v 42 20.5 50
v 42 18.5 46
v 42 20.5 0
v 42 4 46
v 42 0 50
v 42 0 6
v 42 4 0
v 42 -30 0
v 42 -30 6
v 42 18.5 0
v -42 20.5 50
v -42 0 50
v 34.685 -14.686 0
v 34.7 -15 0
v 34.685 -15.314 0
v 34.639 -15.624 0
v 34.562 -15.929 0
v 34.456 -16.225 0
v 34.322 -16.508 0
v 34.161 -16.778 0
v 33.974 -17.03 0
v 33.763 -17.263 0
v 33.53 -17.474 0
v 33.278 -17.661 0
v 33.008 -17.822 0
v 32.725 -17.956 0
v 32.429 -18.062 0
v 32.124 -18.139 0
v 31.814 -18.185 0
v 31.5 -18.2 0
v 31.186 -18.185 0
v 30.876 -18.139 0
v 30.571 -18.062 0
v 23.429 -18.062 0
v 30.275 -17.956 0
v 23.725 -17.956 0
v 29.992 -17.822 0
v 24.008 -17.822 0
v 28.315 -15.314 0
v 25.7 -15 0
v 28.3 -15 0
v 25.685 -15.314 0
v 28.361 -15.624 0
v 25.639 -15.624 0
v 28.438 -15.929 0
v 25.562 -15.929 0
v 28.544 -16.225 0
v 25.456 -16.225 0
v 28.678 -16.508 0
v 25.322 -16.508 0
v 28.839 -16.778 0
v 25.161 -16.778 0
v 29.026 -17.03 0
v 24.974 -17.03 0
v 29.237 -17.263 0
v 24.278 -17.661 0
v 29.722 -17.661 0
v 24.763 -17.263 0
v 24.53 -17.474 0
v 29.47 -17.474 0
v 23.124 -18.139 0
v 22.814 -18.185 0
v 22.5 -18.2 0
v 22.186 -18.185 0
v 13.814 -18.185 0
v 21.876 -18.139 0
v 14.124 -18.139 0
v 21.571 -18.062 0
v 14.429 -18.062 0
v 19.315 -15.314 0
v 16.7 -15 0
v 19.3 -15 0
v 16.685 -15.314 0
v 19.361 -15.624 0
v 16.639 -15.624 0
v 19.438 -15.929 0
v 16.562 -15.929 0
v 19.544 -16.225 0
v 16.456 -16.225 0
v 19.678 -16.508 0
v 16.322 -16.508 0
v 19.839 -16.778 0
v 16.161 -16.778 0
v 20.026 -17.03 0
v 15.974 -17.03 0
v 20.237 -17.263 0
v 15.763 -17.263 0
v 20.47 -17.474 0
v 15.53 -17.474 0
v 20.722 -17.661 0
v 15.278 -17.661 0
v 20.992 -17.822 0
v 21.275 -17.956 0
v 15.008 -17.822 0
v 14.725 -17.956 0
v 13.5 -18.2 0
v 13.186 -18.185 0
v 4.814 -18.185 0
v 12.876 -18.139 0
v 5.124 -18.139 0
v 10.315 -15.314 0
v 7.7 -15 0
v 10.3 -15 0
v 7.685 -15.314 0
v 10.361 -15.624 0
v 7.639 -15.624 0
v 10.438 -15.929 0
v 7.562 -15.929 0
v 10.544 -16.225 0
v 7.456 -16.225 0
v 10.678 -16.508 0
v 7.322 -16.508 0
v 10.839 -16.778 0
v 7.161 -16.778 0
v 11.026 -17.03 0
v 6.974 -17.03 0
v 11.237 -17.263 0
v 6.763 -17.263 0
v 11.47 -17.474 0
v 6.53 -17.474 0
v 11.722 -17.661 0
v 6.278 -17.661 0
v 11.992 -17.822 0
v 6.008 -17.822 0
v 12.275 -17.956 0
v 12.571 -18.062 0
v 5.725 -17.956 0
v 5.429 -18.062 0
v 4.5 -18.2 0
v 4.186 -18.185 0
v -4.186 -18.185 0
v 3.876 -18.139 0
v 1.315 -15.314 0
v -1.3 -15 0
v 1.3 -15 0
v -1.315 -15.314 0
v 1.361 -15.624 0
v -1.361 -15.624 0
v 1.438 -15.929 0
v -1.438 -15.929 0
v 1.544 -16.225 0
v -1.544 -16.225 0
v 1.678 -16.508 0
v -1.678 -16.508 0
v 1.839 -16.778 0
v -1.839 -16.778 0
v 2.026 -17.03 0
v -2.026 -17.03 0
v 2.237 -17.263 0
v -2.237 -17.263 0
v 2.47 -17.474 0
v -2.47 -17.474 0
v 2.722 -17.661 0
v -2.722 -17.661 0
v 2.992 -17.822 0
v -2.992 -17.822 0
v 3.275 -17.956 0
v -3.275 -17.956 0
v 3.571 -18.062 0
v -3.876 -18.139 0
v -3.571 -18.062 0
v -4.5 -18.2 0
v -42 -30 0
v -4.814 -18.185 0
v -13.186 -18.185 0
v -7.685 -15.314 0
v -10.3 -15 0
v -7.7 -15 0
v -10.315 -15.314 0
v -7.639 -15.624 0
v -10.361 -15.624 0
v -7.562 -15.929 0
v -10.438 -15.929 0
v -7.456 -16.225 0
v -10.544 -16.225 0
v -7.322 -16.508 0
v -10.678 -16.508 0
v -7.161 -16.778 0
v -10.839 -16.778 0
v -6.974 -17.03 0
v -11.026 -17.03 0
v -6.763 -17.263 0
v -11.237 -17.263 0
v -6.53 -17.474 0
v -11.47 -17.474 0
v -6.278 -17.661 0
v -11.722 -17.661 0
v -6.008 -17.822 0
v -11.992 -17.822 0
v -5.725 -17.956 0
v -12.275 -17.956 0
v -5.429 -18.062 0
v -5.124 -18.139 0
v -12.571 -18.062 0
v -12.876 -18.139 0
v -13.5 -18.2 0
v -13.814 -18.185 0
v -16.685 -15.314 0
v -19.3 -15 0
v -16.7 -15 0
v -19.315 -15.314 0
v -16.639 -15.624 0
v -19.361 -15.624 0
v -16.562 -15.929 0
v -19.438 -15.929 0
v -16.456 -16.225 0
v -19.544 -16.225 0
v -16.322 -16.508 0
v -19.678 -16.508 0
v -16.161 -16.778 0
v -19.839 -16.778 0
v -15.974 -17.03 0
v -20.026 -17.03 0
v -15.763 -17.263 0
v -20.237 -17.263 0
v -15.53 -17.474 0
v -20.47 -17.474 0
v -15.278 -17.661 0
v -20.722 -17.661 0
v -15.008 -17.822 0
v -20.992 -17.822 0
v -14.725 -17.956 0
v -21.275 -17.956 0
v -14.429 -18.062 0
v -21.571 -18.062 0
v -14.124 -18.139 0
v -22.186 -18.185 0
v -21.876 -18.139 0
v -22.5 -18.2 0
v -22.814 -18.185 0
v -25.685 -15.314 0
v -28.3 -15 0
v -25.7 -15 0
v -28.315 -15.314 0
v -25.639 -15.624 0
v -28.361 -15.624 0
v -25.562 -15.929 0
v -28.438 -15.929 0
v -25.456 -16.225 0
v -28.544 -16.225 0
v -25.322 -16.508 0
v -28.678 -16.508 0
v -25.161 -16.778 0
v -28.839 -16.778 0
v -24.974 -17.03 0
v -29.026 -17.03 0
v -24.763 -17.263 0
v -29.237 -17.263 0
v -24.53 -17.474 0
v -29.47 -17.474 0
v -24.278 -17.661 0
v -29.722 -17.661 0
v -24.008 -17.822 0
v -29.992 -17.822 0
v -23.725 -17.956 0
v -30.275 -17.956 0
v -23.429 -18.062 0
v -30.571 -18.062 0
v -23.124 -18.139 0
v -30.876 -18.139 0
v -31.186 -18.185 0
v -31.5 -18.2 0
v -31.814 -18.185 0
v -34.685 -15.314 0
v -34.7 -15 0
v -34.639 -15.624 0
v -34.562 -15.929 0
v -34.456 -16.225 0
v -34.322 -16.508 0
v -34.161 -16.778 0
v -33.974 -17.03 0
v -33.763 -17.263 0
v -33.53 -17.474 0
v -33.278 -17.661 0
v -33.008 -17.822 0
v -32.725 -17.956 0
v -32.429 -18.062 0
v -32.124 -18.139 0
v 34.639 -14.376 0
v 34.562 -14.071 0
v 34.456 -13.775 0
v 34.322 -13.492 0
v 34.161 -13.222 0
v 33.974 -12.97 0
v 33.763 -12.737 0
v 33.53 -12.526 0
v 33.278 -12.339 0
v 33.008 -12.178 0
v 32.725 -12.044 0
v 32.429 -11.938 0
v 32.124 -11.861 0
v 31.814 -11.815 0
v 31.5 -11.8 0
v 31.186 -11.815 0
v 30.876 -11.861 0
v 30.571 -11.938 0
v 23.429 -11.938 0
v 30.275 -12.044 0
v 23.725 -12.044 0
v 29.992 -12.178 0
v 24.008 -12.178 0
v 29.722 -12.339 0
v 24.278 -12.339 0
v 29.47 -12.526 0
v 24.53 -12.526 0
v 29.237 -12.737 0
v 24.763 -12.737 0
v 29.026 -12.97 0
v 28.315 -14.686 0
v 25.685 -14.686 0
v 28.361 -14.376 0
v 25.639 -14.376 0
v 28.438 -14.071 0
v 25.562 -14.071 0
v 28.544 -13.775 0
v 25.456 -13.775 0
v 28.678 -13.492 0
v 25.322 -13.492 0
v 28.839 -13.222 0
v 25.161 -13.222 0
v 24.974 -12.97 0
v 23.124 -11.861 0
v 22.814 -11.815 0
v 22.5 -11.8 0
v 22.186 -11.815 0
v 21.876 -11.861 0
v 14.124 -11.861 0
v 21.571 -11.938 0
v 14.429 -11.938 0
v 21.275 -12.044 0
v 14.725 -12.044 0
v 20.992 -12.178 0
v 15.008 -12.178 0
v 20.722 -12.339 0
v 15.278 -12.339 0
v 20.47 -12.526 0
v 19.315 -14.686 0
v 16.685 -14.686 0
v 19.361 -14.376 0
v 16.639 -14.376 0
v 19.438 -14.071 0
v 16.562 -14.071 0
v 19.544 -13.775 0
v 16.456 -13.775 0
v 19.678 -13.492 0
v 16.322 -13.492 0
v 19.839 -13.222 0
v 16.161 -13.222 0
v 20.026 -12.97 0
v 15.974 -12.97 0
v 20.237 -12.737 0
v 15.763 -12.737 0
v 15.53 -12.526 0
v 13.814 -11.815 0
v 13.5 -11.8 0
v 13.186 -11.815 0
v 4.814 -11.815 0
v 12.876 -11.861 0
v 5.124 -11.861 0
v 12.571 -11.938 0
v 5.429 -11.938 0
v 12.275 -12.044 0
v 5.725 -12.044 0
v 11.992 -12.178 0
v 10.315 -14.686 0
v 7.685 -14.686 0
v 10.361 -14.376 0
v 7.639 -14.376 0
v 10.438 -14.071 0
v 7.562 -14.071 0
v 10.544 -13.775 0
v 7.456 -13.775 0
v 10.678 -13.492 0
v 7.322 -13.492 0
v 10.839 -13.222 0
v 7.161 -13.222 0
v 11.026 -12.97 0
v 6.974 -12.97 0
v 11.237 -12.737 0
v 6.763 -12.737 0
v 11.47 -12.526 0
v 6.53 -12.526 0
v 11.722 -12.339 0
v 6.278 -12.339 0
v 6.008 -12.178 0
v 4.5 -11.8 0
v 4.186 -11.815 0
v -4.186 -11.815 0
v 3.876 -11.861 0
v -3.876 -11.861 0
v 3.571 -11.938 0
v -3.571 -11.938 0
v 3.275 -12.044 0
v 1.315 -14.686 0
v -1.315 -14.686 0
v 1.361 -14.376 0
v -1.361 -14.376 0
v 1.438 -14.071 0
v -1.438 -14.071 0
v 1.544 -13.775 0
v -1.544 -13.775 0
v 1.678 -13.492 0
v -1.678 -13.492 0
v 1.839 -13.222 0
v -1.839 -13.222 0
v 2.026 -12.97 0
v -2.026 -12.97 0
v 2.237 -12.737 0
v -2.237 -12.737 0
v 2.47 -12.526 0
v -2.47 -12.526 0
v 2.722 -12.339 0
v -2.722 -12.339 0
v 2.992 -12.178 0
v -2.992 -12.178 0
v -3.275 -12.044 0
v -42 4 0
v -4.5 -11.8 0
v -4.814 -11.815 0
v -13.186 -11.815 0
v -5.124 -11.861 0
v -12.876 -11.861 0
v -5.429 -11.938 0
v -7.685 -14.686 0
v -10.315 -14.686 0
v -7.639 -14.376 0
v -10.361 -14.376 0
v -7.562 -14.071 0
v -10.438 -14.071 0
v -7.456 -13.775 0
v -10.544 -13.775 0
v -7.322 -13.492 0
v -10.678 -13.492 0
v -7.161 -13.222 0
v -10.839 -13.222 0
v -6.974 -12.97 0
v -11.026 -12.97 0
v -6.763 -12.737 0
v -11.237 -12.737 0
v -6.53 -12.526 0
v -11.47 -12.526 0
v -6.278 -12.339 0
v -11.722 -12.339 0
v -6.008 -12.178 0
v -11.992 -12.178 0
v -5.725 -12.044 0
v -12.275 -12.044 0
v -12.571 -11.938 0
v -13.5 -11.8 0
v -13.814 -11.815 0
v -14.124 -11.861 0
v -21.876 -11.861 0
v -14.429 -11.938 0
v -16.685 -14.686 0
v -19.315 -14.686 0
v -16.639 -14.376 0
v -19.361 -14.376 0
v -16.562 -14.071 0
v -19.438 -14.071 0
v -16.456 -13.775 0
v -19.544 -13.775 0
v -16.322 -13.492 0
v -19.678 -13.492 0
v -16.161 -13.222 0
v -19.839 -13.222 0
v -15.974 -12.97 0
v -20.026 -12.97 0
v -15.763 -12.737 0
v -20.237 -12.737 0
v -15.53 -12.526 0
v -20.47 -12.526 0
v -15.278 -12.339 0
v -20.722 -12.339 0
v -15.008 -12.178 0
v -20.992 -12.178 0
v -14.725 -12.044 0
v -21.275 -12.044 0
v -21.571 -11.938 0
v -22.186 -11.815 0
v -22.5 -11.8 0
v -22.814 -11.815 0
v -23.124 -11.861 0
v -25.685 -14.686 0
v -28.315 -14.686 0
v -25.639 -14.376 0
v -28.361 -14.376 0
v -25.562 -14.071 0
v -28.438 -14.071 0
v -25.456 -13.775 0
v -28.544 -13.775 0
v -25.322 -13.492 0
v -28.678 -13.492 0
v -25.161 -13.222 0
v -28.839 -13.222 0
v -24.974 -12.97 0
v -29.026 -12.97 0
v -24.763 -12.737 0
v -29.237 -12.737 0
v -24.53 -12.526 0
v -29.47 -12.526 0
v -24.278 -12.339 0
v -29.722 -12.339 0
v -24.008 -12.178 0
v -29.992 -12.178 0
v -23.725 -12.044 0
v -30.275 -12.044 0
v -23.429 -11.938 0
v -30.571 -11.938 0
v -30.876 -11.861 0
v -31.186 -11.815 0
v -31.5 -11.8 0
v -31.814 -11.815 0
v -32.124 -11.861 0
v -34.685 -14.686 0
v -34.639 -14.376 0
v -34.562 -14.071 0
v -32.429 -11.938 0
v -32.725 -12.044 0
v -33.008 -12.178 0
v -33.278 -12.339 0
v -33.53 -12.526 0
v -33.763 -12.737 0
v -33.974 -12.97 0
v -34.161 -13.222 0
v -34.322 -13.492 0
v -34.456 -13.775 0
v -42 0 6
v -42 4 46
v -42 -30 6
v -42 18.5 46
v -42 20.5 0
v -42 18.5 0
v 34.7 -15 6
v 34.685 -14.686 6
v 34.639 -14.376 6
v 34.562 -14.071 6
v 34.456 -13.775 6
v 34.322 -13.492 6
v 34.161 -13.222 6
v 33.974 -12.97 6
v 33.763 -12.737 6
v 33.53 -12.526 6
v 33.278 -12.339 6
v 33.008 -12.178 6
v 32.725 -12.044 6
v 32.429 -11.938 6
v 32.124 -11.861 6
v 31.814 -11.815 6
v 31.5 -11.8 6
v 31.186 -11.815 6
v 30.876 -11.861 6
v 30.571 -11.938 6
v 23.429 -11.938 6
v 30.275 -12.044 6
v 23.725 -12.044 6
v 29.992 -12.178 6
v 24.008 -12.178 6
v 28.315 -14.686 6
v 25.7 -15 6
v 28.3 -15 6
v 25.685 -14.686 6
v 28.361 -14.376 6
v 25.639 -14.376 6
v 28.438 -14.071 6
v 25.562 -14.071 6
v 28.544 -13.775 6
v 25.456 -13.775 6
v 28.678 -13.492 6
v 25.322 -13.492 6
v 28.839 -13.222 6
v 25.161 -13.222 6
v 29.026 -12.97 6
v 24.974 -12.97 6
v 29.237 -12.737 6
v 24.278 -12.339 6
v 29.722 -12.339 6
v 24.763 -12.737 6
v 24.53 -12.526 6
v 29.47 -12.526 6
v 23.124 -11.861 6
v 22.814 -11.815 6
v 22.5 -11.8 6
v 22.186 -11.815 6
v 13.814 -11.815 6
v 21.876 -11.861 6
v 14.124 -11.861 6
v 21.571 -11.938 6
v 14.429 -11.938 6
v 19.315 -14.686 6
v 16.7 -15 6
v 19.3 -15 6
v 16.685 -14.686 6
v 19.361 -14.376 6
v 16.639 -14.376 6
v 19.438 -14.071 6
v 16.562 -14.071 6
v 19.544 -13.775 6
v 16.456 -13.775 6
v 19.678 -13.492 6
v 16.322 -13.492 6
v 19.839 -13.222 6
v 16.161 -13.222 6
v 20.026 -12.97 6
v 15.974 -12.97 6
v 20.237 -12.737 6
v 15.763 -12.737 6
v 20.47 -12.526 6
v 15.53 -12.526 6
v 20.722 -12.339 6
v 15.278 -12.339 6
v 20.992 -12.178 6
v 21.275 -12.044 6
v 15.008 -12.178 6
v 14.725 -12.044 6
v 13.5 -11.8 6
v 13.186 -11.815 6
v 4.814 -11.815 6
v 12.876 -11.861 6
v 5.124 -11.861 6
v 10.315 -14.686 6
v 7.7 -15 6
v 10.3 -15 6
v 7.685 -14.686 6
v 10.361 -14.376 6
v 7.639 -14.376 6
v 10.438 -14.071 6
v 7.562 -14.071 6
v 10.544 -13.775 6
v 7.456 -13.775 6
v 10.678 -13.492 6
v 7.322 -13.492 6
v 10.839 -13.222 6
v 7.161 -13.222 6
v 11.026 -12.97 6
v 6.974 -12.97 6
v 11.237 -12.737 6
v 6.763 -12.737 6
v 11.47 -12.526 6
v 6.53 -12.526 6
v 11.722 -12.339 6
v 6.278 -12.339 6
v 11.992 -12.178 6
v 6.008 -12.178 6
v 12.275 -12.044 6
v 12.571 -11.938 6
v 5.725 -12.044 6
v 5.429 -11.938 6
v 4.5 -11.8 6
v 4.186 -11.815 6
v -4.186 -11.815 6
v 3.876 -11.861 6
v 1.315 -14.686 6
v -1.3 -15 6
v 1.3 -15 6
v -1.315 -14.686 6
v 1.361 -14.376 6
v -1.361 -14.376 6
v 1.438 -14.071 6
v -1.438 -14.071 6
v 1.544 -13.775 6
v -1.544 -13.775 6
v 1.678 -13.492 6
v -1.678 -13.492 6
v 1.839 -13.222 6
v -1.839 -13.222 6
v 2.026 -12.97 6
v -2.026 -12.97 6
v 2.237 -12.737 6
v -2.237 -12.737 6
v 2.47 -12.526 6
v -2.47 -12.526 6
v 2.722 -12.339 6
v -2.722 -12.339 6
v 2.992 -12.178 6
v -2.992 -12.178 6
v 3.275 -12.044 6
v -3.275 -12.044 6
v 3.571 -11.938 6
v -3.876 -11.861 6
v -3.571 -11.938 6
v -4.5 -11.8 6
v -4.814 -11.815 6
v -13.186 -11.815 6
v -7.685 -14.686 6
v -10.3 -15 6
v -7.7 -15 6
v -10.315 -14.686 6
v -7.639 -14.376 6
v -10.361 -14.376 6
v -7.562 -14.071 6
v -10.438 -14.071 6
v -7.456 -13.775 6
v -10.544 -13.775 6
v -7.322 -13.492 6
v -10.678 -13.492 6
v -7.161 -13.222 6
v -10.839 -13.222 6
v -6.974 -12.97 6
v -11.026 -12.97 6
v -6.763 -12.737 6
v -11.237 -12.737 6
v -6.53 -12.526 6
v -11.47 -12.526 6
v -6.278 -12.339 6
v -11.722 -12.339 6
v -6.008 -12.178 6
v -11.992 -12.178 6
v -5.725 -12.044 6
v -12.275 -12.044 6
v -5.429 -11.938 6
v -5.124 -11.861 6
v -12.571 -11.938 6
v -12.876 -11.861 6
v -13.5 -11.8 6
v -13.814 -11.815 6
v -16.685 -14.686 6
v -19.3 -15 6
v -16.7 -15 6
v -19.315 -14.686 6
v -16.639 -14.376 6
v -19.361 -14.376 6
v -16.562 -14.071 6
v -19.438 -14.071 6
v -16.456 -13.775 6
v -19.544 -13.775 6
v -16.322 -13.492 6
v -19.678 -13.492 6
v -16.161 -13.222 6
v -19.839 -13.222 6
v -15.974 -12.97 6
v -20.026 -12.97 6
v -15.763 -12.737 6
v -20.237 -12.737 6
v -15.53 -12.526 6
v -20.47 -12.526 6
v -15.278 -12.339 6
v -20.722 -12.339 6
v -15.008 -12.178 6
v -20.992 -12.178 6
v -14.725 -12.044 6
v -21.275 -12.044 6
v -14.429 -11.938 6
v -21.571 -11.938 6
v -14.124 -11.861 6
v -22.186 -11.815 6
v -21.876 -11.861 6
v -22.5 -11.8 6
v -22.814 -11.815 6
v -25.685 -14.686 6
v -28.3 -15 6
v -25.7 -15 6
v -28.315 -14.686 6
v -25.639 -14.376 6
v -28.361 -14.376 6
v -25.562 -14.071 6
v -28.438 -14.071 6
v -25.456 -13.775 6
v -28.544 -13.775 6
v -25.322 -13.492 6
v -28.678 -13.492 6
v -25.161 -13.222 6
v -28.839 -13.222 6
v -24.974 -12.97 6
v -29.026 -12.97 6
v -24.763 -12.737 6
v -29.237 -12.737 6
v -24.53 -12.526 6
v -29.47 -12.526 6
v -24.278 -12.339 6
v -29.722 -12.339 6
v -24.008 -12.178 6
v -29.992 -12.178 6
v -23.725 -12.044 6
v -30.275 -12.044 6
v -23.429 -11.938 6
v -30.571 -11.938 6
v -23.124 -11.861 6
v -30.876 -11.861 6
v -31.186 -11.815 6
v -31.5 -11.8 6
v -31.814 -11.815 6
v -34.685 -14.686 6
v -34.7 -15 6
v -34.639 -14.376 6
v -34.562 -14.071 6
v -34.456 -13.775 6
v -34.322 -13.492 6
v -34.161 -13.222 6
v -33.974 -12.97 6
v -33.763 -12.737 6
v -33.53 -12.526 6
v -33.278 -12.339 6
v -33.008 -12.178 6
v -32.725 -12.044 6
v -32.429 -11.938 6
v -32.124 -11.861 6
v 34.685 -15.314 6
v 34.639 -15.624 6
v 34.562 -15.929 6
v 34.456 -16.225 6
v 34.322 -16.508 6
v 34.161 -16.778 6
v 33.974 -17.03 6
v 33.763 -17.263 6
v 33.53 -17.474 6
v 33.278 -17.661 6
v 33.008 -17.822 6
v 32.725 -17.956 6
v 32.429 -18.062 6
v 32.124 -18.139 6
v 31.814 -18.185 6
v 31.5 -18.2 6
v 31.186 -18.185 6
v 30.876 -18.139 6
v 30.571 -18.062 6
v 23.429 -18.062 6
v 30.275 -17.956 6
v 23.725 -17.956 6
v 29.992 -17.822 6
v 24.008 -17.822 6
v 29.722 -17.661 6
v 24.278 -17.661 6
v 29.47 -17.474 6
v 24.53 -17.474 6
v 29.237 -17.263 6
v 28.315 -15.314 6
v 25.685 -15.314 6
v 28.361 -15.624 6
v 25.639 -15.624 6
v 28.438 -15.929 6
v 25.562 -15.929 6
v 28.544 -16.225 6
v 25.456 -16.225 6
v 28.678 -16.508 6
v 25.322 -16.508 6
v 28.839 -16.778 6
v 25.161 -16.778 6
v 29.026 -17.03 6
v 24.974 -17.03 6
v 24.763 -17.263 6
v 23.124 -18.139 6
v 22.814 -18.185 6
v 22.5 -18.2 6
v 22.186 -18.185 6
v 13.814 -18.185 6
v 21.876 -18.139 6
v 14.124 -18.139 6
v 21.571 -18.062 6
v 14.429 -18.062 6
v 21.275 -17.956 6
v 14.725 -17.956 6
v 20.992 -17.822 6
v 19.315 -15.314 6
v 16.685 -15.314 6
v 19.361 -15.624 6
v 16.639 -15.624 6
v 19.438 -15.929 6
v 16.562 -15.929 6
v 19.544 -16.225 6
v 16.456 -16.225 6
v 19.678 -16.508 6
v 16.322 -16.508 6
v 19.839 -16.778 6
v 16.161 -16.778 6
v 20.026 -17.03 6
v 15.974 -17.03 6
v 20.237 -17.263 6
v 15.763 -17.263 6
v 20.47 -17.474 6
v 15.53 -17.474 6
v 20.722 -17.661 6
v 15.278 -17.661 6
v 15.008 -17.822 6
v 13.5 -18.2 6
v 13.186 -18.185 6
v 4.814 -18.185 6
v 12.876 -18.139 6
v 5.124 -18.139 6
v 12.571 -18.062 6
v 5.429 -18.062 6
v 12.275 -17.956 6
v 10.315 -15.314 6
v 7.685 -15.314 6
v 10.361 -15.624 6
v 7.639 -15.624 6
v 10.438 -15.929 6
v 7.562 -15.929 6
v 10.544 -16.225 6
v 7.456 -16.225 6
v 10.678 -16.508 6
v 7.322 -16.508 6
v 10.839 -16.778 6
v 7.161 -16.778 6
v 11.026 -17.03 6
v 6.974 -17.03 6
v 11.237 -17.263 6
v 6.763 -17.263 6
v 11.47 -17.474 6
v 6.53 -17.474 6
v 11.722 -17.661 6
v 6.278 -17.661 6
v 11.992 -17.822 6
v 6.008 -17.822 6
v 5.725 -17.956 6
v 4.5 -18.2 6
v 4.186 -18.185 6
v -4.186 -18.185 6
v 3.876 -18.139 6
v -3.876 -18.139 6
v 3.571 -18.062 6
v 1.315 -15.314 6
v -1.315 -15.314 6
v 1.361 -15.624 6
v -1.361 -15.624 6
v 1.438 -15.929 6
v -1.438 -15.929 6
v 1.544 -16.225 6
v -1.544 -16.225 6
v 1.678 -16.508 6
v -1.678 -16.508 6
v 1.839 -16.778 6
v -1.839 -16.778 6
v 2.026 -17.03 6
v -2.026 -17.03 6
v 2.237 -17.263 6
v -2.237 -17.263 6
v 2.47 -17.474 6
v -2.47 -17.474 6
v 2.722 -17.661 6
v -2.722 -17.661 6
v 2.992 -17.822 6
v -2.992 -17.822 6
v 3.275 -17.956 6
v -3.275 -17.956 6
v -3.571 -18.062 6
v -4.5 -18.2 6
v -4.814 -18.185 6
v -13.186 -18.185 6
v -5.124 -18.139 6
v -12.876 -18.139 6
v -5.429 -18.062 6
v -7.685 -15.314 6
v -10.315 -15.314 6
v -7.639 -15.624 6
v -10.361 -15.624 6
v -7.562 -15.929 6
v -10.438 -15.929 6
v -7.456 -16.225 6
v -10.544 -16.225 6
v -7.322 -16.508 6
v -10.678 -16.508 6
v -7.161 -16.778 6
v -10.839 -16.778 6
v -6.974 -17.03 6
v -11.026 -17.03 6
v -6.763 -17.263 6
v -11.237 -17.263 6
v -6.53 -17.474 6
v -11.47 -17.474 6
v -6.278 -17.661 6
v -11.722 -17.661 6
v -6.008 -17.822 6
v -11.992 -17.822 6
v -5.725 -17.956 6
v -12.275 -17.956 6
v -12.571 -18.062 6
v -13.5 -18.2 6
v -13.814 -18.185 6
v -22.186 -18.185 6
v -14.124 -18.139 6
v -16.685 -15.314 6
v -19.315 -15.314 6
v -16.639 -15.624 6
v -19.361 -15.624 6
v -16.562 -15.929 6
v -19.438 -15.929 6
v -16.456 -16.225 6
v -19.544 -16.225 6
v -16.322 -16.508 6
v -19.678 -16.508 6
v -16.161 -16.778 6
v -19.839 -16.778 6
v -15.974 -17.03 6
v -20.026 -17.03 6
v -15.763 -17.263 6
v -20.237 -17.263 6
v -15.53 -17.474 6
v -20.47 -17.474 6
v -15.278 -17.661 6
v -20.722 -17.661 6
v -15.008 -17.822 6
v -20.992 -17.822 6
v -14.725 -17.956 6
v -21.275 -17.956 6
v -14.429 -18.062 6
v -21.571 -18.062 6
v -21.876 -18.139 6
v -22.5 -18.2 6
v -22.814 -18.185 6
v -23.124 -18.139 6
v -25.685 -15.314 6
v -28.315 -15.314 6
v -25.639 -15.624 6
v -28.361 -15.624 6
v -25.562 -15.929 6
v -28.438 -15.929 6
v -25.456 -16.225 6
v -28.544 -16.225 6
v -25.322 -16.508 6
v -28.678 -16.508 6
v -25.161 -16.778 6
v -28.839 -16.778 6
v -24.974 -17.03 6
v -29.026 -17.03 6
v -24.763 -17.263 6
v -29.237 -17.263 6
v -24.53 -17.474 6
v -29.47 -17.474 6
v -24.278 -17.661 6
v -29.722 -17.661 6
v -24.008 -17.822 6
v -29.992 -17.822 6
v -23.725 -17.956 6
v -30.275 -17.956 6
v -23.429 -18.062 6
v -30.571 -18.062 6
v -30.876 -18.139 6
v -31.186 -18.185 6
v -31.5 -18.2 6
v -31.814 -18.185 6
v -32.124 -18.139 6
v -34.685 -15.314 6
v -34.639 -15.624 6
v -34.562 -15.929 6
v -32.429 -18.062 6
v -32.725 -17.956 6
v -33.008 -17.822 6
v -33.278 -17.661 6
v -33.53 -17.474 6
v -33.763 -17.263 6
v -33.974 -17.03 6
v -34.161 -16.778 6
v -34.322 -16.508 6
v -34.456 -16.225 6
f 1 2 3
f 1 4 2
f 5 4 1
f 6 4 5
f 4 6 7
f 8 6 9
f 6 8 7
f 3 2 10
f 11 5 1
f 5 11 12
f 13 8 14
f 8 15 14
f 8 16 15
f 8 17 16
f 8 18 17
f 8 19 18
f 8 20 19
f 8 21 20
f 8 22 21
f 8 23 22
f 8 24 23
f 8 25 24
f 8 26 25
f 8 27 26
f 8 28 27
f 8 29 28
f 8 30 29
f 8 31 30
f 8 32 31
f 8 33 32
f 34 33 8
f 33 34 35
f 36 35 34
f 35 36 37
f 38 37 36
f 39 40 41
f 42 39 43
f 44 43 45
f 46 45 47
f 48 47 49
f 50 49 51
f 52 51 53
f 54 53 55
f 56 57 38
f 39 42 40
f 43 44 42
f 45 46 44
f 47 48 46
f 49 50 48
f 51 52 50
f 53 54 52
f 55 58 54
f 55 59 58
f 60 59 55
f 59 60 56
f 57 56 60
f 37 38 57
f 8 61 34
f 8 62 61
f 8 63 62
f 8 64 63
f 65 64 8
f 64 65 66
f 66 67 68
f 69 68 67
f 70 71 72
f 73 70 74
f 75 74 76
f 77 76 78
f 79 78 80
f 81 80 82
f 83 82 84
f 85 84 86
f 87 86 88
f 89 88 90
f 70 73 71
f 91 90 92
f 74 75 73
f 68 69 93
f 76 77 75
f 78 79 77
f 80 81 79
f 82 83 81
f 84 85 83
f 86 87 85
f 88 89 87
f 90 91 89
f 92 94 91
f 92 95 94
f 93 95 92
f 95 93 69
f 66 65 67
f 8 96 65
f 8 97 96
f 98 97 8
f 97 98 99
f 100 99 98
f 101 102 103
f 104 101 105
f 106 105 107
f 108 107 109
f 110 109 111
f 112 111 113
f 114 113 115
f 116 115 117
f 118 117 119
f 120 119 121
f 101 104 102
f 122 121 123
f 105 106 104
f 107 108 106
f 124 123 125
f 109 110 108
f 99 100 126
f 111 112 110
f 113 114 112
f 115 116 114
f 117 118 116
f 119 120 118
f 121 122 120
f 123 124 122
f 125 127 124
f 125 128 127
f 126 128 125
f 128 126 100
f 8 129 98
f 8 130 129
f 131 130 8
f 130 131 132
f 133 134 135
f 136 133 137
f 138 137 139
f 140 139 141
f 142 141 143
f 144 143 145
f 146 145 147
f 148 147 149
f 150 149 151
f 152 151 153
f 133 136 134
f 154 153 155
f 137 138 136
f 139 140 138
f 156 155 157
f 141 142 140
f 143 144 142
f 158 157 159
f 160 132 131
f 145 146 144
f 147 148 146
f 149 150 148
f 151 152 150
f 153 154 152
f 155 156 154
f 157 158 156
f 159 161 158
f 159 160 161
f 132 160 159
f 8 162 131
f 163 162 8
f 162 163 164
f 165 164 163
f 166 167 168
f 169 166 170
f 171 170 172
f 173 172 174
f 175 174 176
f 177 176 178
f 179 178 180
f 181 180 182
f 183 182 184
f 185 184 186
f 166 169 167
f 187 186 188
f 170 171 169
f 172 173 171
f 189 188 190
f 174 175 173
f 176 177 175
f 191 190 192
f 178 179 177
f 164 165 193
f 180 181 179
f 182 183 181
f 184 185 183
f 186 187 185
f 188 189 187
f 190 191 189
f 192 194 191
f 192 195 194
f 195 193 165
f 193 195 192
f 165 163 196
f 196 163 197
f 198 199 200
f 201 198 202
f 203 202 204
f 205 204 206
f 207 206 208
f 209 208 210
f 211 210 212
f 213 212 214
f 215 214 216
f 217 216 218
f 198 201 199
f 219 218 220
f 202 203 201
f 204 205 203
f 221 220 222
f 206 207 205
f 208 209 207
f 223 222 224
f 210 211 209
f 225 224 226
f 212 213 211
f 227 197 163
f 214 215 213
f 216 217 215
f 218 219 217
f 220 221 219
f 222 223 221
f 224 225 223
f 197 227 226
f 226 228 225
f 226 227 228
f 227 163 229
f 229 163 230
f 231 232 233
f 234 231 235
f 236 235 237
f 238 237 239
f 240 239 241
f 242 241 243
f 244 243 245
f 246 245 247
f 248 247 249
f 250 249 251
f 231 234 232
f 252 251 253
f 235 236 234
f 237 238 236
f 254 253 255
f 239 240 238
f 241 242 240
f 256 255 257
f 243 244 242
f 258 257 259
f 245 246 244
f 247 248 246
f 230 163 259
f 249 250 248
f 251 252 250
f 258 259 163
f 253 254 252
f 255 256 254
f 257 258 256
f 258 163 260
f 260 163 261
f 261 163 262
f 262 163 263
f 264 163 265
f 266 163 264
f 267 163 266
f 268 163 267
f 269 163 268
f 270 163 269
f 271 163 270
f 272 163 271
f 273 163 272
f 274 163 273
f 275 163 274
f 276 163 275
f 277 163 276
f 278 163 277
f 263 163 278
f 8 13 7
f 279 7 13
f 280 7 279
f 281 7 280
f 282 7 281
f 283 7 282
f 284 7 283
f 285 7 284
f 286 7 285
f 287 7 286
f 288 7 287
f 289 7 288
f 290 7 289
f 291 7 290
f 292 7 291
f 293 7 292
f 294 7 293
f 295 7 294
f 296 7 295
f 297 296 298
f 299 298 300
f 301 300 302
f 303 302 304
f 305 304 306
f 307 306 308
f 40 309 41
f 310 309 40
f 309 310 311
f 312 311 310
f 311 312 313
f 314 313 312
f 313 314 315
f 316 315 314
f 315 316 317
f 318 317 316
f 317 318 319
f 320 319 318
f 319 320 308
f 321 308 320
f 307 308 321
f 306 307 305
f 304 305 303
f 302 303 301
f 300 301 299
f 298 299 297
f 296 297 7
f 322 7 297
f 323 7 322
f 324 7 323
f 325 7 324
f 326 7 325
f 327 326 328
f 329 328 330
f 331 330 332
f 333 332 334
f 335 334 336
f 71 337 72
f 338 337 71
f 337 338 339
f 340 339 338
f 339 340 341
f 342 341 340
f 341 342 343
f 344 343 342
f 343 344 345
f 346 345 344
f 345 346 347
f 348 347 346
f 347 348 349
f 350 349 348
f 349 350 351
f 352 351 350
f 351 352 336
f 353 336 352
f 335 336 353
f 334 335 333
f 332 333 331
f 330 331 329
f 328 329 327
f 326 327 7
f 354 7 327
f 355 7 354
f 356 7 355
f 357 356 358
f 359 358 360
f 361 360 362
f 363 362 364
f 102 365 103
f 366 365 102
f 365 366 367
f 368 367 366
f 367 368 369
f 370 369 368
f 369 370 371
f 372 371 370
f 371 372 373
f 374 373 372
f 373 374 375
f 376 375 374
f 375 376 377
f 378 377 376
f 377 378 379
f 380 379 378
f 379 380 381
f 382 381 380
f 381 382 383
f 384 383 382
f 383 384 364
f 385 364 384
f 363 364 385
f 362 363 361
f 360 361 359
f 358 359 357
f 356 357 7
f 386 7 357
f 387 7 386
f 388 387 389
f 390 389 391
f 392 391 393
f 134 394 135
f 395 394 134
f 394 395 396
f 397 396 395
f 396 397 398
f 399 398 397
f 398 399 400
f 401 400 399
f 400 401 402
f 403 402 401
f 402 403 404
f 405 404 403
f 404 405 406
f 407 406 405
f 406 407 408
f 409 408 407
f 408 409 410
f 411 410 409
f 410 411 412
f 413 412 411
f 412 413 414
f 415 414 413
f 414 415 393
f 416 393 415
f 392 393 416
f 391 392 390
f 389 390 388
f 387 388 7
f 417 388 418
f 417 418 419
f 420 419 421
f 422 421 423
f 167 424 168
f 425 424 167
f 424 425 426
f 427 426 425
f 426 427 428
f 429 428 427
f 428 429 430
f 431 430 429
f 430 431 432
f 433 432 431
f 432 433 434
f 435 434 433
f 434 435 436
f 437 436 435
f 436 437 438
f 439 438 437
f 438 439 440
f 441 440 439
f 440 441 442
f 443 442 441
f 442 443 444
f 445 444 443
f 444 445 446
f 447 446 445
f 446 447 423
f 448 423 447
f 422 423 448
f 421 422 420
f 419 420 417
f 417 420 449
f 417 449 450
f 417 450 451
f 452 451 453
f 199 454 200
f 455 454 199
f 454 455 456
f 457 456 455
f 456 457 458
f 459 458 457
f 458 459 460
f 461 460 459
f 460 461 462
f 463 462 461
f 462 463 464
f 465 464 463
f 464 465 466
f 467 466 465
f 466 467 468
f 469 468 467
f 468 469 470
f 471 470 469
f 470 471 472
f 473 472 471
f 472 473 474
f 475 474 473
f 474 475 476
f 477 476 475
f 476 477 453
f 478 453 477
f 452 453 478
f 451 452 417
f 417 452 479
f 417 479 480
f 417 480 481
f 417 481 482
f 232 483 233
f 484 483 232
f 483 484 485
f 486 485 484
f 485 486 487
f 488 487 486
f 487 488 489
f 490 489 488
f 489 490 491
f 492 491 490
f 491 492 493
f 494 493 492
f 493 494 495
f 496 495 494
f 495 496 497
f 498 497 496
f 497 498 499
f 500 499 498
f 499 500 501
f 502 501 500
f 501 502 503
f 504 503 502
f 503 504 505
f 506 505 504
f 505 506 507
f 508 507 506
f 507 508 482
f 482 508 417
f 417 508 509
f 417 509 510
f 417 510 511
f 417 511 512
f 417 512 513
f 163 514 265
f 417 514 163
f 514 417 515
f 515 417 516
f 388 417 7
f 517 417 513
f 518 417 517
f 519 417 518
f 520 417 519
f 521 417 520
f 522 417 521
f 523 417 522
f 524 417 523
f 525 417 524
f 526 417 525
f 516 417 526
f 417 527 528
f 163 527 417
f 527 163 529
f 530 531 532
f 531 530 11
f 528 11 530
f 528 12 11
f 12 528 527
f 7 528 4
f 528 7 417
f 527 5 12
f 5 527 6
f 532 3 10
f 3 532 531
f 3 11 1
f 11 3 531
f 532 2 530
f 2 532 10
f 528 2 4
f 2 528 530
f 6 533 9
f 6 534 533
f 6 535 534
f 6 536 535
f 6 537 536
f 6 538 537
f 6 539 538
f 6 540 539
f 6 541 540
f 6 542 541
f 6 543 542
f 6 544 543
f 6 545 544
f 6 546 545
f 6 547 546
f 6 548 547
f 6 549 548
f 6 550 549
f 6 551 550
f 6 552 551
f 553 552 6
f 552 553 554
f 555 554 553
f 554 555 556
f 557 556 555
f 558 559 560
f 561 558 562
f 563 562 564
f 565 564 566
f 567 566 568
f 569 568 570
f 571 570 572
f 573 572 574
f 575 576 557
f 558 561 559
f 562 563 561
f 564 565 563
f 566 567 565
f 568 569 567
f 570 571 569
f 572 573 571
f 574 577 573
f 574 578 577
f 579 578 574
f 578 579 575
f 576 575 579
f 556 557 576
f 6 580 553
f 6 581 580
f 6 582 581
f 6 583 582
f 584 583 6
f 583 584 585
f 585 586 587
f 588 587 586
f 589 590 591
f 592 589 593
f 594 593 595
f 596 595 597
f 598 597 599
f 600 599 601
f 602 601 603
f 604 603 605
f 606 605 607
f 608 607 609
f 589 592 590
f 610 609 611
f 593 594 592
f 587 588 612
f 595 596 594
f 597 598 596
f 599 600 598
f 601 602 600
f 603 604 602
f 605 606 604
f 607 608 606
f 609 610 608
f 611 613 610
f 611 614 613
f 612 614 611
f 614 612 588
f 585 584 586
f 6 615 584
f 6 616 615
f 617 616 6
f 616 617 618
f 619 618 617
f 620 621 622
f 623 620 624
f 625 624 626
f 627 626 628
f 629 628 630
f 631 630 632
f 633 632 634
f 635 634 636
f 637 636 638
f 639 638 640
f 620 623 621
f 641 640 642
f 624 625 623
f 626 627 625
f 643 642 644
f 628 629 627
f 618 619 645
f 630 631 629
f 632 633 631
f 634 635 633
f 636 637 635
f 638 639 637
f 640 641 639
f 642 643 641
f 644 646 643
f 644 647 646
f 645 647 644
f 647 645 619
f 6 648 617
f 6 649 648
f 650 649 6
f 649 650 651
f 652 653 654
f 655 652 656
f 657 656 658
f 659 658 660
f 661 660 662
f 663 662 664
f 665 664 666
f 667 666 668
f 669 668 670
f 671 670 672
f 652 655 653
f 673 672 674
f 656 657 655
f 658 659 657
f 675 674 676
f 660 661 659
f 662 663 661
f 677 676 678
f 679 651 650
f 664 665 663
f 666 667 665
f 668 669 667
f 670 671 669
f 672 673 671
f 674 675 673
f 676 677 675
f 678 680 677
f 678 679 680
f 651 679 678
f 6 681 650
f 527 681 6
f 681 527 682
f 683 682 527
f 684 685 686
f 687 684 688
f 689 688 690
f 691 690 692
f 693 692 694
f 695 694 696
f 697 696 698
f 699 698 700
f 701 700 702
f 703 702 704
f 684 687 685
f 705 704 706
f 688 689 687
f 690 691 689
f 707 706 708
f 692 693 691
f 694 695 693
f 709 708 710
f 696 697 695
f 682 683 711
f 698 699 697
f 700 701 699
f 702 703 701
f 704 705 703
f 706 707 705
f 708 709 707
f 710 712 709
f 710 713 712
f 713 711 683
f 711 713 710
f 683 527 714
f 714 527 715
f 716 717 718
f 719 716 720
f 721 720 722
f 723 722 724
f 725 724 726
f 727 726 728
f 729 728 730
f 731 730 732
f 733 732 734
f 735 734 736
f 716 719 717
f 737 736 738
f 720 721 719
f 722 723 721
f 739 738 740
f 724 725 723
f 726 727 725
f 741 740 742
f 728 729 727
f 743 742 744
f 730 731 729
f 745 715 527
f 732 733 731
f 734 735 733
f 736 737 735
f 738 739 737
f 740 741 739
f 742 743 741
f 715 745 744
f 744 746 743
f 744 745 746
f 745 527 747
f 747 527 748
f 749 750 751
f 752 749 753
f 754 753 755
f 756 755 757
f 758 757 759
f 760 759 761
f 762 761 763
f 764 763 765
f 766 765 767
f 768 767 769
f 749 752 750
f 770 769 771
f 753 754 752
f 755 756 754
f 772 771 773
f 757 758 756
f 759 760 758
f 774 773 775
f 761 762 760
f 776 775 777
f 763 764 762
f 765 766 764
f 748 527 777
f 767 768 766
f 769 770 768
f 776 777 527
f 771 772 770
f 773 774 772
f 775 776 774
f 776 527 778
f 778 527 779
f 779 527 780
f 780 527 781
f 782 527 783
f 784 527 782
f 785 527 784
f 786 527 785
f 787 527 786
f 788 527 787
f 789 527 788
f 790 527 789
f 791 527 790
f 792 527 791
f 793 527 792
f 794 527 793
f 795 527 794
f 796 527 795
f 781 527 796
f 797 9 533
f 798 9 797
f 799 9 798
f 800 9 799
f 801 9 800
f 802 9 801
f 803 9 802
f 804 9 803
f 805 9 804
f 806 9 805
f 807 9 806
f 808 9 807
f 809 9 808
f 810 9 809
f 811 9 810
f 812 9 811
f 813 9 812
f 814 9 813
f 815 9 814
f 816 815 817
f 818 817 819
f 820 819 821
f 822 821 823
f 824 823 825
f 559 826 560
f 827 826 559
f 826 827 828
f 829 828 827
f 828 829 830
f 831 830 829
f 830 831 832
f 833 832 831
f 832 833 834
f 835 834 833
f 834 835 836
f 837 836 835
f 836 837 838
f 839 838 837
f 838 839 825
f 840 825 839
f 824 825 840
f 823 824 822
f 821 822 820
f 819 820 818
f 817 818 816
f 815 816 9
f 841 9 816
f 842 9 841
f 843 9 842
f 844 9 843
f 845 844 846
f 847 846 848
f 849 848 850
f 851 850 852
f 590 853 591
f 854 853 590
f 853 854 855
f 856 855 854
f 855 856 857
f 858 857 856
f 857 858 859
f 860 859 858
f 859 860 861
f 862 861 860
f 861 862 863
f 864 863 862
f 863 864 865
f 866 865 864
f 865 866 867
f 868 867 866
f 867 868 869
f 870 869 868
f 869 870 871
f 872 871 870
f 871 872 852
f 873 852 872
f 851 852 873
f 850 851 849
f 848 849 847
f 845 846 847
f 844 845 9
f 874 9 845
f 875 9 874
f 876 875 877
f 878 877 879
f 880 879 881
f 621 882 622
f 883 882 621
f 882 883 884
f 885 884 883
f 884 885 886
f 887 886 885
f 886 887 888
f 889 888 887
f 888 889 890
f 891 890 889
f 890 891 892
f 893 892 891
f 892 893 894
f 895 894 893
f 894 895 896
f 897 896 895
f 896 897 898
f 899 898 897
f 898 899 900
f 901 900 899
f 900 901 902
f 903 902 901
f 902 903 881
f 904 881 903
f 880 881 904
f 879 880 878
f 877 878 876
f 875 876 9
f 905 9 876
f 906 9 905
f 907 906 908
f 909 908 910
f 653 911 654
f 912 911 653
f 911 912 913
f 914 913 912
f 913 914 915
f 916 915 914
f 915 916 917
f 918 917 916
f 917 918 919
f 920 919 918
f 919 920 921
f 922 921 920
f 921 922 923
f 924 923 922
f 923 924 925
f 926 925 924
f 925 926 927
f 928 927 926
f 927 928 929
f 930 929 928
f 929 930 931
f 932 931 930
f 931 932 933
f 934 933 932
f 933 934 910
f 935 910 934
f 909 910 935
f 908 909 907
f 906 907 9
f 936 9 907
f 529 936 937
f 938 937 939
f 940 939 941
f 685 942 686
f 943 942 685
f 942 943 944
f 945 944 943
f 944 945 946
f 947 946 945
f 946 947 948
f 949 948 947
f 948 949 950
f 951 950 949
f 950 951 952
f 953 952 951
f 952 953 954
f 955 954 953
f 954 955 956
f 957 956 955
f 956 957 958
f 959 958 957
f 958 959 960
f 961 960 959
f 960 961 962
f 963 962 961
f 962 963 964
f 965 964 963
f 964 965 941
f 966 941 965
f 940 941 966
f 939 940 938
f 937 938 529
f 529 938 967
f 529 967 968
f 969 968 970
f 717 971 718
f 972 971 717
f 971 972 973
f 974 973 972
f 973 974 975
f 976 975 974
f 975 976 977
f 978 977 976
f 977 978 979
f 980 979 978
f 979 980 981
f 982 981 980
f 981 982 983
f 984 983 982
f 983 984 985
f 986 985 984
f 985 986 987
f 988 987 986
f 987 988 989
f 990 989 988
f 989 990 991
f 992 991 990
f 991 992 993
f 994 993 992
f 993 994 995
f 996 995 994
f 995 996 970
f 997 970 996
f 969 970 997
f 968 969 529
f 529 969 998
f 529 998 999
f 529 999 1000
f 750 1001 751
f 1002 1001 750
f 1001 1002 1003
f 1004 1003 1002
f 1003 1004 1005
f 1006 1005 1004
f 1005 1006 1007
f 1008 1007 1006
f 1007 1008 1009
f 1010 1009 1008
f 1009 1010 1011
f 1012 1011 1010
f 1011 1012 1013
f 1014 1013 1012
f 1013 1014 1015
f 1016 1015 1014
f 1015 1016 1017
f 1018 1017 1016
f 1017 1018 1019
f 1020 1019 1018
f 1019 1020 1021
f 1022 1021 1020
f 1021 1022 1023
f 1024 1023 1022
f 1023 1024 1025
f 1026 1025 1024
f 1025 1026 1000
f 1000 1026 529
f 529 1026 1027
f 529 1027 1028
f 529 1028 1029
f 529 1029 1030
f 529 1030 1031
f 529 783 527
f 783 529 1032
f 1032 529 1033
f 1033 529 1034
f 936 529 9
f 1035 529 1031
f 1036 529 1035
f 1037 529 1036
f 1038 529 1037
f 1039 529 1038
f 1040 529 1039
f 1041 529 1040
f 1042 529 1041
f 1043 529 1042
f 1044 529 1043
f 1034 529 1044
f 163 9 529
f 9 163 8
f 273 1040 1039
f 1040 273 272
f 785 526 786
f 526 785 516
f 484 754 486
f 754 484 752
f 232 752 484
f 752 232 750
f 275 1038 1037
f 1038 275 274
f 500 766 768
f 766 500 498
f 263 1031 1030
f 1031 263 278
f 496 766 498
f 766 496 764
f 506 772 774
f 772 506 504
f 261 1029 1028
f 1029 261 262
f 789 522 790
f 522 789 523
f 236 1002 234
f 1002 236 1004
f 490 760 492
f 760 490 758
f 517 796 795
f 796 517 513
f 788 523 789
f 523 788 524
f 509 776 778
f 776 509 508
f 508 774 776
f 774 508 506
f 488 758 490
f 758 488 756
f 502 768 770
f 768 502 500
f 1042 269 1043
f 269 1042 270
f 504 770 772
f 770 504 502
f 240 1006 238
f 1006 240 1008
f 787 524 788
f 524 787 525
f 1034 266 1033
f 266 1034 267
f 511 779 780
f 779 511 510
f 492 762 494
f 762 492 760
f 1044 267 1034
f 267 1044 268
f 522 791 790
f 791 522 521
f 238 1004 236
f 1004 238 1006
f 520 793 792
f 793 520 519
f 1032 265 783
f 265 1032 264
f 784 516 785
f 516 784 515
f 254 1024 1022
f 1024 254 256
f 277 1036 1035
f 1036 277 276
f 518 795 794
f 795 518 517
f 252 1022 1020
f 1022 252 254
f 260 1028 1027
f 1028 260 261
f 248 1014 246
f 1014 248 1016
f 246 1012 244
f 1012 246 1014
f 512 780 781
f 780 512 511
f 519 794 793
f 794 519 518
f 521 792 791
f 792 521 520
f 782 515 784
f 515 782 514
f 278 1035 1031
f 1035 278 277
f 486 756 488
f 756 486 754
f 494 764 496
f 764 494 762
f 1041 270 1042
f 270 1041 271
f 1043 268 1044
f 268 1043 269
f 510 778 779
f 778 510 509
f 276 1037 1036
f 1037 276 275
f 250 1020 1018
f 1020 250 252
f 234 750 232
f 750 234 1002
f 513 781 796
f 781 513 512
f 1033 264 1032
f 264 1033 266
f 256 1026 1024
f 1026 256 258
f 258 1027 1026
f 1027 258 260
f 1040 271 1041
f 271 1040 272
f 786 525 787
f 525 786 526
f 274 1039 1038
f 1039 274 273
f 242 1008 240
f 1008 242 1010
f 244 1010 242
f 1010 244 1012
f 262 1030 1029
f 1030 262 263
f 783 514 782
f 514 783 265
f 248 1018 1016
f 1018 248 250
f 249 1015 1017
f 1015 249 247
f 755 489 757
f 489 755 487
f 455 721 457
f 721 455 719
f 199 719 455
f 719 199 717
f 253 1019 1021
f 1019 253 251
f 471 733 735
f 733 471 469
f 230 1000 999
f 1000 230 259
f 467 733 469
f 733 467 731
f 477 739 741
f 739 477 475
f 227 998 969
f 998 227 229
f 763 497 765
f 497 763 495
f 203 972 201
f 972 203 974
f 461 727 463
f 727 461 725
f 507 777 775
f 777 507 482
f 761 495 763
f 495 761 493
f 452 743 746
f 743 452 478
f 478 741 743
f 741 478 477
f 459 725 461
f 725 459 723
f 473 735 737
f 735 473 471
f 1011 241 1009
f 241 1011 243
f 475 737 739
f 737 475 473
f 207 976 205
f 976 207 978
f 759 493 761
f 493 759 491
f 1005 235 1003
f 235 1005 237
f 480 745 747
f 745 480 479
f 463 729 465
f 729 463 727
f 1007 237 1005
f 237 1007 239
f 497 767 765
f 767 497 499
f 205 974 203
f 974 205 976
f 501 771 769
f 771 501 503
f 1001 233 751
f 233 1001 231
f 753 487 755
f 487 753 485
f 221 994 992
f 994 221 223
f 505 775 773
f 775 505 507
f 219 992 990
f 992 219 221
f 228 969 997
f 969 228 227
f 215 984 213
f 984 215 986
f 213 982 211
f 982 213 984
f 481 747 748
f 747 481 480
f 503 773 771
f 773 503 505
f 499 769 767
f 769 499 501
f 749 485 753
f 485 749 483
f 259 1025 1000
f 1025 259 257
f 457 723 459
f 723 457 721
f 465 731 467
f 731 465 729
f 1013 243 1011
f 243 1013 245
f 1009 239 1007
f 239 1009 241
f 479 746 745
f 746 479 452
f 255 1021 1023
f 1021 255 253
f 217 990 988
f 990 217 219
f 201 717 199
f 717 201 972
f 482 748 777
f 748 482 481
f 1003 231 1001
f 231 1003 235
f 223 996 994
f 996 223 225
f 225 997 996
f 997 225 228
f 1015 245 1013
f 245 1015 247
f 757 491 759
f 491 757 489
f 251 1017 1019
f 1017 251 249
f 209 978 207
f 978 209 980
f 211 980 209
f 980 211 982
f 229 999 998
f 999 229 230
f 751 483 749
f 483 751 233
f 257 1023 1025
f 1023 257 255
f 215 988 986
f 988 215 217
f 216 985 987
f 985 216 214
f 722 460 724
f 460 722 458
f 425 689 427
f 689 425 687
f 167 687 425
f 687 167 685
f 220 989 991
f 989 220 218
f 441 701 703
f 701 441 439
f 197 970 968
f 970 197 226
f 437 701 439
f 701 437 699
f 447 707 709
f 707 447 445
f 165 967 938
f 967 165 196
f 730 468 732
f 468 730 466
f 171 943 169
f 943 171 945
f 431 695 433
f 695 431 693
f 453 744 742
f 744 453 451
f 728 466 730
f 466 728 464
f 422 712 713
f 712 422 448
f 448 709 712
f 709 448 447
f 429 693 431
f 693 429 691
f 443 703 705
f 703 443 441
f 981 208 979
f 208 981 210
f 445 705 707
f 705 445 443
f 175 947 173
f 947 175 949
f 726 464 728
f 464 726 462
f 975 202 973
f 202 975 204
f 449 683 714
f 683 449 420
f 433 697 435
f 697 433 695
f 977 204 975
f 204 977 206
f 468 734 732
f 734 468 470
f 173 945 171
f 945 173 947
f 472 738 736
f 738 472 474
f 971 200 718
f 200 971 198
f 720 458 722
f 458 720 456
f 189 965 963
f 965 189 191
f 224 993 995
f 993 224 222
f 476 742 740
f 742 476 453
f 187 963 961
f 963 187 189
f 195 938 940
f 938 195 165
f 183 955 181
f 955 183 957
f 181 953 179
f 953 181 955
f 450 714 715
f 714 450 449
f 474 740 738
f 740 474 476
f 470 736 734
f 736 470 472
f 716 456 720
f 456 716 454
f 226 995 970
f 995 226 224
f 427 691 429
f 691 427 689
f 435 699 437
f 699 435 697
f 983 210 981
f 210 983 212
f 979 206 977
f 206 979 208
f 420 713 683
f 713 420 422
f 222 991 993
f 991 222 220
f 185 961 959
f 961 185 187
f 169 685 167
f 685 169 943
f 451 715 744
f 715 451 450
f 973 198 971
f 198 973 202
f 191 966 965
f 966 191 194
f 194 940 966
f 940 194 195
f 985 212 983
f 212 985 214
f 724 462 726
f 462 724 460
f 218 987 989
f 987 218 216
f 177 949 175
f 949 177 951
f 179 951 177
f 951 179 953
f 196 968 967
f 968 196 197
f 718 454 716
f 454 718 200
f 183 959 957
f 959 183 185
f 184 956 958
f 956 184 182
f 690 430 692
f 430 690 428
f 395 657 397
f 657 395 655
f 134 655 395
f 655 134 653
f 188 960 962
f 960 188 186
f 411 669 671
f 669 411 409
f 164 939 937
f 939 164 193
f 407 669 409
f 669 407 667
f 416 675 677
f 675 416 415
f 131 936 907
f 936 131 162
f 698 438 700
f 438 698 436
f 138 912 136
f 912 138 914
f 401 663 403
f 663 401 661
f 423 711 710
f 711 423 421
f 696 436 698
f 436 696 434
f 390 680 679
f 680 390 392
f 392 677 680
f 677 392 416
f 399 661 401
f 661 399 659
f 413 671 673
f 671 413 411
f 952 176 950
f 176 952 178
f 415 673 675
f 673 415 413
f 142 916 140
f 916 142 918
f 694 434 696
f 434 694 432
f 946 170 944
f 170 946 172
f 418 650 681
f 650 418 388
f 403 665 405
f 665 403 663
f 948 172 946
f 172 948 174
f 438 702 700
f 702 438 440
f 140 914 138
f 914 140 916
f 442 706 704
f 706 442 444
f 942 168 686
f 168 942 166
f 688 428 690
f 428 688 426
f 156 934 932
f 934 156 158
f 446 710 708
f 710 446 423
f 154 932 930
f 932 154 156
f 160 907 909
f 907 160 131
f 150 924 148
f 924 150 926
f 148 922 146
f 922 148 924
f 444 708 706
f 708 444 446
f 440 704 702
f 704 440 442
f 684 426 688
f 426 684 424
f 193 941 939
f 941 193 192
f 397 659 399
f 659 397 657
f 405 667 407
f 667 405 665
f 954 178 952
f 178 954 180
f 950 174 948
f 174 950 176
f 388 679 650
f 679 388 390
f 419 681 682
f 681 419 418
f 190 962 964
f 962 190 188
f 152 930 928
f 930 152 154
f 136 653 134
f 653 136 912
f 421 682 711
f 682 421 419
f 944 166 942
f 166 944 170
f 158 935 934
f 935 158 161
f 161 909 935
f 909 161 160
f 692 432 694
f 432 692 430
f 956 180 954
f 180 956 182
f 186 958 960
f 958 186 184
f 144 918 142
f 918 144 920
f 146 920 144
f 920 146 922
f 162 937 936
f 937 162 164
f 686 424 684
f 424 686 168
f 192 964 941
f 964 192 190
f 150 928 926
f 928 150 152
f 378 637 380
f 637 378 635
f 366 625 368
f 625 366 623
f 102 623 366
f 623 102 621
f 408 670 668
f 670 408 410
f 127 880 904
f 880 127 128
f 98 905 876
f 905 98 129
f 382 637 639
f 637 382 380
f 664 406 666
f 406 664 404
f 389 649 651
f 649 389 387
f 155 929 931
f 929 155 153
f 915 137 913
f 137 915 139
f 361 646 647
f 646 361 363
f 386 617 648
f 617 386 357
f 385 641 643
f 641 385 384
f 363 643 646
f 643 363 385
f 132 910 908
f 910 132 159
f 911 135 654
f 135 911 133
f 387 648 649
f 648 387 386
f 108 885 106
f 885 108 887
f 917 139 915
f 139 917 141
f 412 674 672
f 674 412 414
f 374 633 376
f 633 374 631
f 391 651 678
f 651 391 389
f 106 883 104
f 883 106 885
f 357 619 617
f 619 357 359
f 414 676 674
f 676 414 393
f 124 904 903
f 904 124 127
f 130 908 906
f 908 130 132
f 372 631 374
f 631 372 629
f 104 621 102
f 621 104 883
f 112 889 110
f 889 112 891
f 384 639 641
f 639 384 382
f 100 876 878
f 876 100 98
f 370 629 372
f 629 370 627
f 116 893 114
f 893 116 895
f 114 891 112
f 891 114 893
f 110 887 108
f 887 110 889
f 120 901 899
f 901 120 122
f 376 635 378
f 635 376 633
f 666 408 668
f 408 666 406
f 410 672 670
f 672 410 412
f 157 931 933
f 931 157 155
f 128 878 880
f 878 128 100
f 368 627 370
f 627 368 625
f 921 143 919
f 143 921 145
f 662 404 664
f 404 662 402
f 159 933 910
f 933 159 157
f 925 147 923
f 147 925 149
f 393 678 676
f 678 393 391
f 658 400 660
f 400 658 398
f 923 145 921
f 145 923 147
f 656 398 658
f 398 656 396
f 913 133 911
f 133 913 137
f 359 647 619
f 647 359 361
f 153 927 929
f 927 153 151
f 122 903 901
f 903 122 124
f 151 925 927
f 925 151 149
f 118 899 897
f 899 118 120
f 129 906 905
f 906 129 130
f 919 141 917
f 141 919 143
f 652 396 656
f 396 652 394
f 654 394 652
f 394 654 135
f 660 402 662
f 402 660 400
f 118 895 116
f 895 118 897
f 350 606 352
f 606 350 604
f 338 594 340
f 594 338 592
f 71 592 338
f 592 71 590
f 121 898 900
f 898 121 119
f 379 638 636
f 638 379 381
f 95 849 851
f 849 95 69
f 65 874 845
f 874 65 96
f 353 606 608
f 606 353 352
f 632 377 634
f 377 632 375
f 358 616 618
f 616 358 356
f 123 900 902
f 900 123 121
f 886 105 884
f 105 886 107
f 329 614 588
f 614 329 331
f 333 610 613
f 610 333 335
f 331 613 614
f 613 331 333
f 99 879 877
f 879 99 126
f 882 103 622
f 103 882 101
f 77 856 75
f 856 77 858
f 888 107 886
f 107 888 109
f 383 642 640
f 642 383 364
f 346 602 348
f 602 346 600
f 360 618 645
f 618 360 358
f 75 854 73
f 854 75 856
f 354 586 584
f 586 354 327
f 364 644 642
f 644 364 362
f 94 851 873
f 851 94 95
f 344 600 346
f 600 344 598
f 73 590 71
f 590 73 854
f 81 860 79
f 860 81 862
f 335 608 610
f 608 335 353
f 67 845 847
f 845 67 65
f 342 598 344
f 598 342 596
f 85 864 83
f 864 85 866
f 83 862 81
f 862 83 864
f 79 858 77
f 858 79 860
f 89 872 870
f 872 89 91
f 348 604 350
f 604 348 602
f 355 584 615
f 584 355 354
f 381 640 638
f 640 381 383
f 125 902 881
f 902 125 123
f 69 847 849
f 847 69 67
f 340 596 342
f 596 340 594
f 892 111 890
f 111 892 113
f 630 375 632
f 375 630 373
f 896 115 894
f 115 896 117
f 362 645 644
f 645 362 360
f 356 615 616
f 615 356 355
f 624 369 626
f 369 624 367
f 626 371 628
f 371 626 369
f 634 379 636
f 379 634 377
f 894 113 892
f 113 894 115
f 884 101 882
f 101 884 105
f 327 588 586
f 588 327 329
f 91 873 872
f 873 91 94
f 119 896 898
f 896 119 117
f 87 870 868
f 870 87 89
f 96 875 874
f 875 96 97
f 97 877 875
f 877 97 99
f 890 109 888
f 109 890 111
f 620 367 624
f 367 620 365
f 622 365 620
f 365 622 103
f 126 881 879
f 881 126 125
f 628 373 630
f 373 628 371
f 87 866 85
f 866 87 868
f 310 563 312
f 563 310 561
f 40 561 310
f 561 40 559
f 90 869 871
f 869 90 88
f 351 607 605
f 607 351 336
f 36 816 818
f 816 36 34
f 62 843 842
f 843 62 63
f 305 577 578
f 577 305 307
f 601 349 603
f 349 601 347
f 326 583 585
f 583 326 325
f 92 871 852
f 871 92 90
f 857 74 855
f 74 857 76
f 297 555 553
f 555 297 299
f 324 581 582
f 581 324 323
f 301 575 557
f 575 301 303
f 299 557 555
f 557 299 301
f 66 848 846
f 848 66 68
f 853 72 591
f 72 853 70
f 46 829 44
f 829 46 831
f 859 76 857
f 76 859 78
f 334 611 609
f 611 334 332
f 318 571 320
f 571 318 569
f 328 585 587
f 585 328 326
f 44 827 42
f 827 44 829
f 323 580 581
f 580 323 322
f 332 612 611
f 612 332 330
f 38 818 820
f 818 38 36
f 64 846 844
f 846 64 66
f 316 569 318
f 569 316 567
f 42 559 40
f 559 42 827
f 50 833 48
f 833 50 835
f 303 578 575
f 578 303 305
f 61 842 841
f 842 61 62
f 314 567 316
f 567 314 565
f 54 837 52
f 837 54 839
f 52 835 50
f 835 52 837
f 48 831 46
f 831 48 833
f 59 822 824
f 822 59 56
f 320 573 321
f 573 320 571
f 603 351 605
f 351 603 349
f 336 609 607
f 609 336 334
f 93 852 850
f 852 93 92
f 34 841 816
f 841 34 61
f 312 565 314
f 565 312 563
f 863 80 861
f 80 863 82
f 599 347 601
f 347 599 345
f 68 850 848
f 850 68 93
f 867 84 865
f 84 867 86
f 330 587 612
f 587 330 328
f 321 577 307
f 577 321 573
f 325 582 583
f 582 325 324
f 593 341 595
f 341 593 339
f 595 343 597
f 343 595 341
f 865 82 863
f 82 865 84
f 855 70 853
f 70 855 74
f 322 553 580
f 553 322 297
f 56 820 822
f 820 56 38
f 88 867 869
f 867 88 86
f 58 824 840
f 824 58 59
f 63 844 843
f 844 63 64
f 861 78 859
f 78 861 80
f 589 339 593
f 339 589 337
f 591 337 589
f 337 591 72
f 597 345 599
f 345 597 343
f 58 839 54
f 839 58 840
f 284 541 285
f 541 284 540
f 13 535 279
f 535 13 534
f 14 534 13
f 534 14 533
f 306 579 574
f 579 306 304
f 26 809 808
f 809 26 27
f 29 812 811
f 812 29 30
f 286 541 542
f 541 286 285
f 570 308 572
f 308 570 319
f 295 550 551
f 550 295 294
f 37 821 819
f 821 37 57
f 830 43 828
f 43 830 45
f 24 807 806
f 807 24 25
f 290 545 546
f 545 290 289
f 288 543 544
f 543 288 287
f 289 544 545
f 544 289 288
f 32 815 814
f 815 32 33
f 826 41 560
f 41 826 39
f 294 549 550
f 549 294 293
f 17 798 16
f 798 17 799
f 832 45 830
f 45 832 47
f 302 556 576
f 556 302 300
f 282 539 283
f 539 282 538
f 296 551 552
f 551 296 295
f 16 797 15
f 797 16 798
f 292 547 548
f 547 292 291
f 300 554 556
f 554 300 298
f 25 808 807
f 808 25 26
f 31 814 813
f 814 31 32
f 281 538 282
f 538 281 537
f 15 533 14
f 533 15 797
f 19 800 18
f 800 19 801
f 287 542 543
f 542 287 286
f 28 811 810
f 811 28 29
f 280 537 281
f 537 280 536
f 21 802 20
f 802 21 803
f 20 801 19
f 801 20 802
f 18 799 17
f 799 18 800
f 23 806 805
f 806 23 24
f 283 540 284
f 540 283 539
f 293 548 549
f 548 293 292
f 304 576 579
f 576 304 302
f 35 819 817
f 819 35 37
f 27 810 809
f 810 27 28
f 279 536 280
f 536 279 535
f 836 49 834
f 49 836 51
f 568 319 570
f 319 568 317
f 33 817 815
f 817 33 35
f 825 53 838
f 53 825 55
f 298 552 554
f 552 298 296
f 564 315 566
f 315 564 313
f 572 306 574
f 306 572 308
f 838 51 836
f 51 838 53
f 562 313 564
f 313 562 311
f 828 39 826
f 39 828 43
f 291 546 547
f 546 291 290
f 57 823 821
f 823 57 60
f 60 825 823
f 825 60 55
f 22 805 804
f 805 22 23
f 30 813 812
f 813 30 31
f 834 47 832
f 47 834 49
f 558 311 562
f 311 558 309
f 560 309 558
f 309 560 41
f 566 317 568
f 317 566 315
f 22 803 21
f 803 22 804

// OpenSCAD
// PCR Strip Holder for Ice Bucket
// Designed to hang over a 12mm wall and hold an 8-tube PCR strip.

// --- Dimensions ---
length_x      = 84.0;    // Total extrusion length along X
wall_gap      = 12.5;    // Gap for the bucket wall (16.5 - 4.0 = 12.5)
inner_leg_y   = 4.0;     // Y-coordinate of the inner leg face
outer_leg_y   = 20.5;    // Y-coordinate of the outer leg face
leg_thickness = 2.0;     // Thickness of the vertical legs (20.5 - 18.5 = 2.0)
leg_height    = 50.0;    // Height of the vertical legs
bridge_thick  = 4.0;     // Thickness of the top bridge (50 - 46 = 4)
bridge_height  = 50.0;   // Z-height of the top of the bridge
ledge_thick   = 6.0;     // Thickness of the ledge (Z: 0 to 6)
ledge_width   = 30.0;    // How far the ledge extends into the ice (-Y direction)
tube_hole_d    = 6.4;    // Diameter of the PCR tube holes
tube_hole_y   = -15.0;   // Y-position of the tube holes
tube_hole_x_p = 9.0;     // Pitch/spacing between tube holes along X
num_tubes     = 8;        // Number of tubes

$fn = 64;

// --- Calculations ---
// The profile is defined in the YZ plane and extruded along X.
// The profile is an upside-down U.
// Inner leg: y from 0 to 4, z from 0 to 50.
// Outer leg: y from 16.5 to 20.5, z from 0 to 50.
// Bridge: y from 4 to 16.5, z from 46 to 50.
// Ledge: y from 0 to -30, z from 0 to 6.

module profile_yz() {
    difference() {
        // Main U-shape profile
        union() {
            // Inner Leg
            translate([0, 0]) square([inner_leg_y, leg_height]);
            // Outer Leg
            translate([outer_leg_y - leg_thickness, 0]) square([leg_thickness, leg_height]);
            // Bridge
            translate([inner_leg_y, bridge_height - bridge_thick]) 
                square([outer_leg_y - inner_leg_y, bridge_thick]);
            // Ledge
            translate([-ledge_width, 0]) square([ledge_width, ledge_thick]);
        }
        
        // Subtract the tube holes from the ledge
        // Holes are centered along X. 
        // Total length of holes span: (num_tubes - 1) * tube_hole_x_p
        // We center this span on X=0.
        for (i = [0 : num_tubes - 1]) {
            x_pos = (i - (num_tubes - 1) / 2) * tube_hole_x_p;
            translate([x_pos, tube_hole_y, -1]) 
                circle(d = tube_hole_d);
        }
    }
}

// --- Final Assembly ---
// The profile is extruded along X, centered on X=0.
// The profile is in the YZ plane.
// To achieve this, we use linear_extrude on the 2D profile.

translate([-length_x / 2, 0, 0])
    linear_extrude(height = 1) // This is a placeholder; we use the 2D profile logic
    intersection() {
        // We define the 2D shape and extrude it along X.
        // However, the prompt says "profile in YZ plane extruded 84mm along X".
        // This means the 2D shape is in YZ, and we extrude along X.
        
        // Let's build the 3D object by extruding the 2D profile.
        // Since OpenSCAD extrudes along Z, we must rotate the profile.
        
        rotate([90, 0, 0]) // Rotate profile to lie in XY plane for extrusion
        linear_extrude(height = length_x)
        difference() {
            // The 2D profile (YZ)
            union() {
                // Inner Leg
                square([inner_leg_y, leg_height]);
                // Outer Leg
                translate([outer_leg_y - leg_thickness, 0]) square([leg_thickness, leg_height]);
                // Bridge
                translate([inner_leg_y, bridge_height - bridge_thick]) square([outer_leg_y - inner_leg_y, bridge_thick]);
                // Ledge
                translate([-ledge_width, 0]) square([ledge_width, ledge_thick]);
            }
            
            // Subtract holes from the ledge in 2D
            // Note: In 2D, the ledge is at Y=0 to -30. The holes are at Y=-15.
            // But our profile is rotated. Let's rethink the construction to be cleaner.
        }
    }

// --- REWRITTEN CLEAN CONSTRUCTION ---
// To avoid rotation confusion, we build the 3D parts directly.

module holder_3d() {
    // 1. The U-shape (Legs and Bridge)
    union() {
        // Inner Leg
        translate([-length_x/2, 0, 0]) cube([length_x, inner_leg_y, leg_height]);
        // Outer Leg
        translate([-length_x/2, outer_leg_y - leg_thickness, 0]) cube([length_x, leg_thickness, leg_height]);
        // Bridge
        translate([-length_x/2, inner_leg_y, bridge_height - bridge_thick]) cube([length_x, outer_leg_y - inner_leg_y, bridge_thick]);
        // Ledge
        translate([-length_x/2, -ledge_width, 0]) cube([length_x, ledge_width, ledge_thick]);
    }
}

// Final Render
difference() {
    holder_3d();
    
    // Subtract the tube holes
    for (i = [0 : num_tubes - 1]) {
        x_pos = (i - (num_tubes - 1) / 2) * tube_hole_x_p;
        translate([x_pos, tube_hole_y, -1]) 
            cylinder(h = ledge_thick + 2, d = tube_hole_d);
    }
}
